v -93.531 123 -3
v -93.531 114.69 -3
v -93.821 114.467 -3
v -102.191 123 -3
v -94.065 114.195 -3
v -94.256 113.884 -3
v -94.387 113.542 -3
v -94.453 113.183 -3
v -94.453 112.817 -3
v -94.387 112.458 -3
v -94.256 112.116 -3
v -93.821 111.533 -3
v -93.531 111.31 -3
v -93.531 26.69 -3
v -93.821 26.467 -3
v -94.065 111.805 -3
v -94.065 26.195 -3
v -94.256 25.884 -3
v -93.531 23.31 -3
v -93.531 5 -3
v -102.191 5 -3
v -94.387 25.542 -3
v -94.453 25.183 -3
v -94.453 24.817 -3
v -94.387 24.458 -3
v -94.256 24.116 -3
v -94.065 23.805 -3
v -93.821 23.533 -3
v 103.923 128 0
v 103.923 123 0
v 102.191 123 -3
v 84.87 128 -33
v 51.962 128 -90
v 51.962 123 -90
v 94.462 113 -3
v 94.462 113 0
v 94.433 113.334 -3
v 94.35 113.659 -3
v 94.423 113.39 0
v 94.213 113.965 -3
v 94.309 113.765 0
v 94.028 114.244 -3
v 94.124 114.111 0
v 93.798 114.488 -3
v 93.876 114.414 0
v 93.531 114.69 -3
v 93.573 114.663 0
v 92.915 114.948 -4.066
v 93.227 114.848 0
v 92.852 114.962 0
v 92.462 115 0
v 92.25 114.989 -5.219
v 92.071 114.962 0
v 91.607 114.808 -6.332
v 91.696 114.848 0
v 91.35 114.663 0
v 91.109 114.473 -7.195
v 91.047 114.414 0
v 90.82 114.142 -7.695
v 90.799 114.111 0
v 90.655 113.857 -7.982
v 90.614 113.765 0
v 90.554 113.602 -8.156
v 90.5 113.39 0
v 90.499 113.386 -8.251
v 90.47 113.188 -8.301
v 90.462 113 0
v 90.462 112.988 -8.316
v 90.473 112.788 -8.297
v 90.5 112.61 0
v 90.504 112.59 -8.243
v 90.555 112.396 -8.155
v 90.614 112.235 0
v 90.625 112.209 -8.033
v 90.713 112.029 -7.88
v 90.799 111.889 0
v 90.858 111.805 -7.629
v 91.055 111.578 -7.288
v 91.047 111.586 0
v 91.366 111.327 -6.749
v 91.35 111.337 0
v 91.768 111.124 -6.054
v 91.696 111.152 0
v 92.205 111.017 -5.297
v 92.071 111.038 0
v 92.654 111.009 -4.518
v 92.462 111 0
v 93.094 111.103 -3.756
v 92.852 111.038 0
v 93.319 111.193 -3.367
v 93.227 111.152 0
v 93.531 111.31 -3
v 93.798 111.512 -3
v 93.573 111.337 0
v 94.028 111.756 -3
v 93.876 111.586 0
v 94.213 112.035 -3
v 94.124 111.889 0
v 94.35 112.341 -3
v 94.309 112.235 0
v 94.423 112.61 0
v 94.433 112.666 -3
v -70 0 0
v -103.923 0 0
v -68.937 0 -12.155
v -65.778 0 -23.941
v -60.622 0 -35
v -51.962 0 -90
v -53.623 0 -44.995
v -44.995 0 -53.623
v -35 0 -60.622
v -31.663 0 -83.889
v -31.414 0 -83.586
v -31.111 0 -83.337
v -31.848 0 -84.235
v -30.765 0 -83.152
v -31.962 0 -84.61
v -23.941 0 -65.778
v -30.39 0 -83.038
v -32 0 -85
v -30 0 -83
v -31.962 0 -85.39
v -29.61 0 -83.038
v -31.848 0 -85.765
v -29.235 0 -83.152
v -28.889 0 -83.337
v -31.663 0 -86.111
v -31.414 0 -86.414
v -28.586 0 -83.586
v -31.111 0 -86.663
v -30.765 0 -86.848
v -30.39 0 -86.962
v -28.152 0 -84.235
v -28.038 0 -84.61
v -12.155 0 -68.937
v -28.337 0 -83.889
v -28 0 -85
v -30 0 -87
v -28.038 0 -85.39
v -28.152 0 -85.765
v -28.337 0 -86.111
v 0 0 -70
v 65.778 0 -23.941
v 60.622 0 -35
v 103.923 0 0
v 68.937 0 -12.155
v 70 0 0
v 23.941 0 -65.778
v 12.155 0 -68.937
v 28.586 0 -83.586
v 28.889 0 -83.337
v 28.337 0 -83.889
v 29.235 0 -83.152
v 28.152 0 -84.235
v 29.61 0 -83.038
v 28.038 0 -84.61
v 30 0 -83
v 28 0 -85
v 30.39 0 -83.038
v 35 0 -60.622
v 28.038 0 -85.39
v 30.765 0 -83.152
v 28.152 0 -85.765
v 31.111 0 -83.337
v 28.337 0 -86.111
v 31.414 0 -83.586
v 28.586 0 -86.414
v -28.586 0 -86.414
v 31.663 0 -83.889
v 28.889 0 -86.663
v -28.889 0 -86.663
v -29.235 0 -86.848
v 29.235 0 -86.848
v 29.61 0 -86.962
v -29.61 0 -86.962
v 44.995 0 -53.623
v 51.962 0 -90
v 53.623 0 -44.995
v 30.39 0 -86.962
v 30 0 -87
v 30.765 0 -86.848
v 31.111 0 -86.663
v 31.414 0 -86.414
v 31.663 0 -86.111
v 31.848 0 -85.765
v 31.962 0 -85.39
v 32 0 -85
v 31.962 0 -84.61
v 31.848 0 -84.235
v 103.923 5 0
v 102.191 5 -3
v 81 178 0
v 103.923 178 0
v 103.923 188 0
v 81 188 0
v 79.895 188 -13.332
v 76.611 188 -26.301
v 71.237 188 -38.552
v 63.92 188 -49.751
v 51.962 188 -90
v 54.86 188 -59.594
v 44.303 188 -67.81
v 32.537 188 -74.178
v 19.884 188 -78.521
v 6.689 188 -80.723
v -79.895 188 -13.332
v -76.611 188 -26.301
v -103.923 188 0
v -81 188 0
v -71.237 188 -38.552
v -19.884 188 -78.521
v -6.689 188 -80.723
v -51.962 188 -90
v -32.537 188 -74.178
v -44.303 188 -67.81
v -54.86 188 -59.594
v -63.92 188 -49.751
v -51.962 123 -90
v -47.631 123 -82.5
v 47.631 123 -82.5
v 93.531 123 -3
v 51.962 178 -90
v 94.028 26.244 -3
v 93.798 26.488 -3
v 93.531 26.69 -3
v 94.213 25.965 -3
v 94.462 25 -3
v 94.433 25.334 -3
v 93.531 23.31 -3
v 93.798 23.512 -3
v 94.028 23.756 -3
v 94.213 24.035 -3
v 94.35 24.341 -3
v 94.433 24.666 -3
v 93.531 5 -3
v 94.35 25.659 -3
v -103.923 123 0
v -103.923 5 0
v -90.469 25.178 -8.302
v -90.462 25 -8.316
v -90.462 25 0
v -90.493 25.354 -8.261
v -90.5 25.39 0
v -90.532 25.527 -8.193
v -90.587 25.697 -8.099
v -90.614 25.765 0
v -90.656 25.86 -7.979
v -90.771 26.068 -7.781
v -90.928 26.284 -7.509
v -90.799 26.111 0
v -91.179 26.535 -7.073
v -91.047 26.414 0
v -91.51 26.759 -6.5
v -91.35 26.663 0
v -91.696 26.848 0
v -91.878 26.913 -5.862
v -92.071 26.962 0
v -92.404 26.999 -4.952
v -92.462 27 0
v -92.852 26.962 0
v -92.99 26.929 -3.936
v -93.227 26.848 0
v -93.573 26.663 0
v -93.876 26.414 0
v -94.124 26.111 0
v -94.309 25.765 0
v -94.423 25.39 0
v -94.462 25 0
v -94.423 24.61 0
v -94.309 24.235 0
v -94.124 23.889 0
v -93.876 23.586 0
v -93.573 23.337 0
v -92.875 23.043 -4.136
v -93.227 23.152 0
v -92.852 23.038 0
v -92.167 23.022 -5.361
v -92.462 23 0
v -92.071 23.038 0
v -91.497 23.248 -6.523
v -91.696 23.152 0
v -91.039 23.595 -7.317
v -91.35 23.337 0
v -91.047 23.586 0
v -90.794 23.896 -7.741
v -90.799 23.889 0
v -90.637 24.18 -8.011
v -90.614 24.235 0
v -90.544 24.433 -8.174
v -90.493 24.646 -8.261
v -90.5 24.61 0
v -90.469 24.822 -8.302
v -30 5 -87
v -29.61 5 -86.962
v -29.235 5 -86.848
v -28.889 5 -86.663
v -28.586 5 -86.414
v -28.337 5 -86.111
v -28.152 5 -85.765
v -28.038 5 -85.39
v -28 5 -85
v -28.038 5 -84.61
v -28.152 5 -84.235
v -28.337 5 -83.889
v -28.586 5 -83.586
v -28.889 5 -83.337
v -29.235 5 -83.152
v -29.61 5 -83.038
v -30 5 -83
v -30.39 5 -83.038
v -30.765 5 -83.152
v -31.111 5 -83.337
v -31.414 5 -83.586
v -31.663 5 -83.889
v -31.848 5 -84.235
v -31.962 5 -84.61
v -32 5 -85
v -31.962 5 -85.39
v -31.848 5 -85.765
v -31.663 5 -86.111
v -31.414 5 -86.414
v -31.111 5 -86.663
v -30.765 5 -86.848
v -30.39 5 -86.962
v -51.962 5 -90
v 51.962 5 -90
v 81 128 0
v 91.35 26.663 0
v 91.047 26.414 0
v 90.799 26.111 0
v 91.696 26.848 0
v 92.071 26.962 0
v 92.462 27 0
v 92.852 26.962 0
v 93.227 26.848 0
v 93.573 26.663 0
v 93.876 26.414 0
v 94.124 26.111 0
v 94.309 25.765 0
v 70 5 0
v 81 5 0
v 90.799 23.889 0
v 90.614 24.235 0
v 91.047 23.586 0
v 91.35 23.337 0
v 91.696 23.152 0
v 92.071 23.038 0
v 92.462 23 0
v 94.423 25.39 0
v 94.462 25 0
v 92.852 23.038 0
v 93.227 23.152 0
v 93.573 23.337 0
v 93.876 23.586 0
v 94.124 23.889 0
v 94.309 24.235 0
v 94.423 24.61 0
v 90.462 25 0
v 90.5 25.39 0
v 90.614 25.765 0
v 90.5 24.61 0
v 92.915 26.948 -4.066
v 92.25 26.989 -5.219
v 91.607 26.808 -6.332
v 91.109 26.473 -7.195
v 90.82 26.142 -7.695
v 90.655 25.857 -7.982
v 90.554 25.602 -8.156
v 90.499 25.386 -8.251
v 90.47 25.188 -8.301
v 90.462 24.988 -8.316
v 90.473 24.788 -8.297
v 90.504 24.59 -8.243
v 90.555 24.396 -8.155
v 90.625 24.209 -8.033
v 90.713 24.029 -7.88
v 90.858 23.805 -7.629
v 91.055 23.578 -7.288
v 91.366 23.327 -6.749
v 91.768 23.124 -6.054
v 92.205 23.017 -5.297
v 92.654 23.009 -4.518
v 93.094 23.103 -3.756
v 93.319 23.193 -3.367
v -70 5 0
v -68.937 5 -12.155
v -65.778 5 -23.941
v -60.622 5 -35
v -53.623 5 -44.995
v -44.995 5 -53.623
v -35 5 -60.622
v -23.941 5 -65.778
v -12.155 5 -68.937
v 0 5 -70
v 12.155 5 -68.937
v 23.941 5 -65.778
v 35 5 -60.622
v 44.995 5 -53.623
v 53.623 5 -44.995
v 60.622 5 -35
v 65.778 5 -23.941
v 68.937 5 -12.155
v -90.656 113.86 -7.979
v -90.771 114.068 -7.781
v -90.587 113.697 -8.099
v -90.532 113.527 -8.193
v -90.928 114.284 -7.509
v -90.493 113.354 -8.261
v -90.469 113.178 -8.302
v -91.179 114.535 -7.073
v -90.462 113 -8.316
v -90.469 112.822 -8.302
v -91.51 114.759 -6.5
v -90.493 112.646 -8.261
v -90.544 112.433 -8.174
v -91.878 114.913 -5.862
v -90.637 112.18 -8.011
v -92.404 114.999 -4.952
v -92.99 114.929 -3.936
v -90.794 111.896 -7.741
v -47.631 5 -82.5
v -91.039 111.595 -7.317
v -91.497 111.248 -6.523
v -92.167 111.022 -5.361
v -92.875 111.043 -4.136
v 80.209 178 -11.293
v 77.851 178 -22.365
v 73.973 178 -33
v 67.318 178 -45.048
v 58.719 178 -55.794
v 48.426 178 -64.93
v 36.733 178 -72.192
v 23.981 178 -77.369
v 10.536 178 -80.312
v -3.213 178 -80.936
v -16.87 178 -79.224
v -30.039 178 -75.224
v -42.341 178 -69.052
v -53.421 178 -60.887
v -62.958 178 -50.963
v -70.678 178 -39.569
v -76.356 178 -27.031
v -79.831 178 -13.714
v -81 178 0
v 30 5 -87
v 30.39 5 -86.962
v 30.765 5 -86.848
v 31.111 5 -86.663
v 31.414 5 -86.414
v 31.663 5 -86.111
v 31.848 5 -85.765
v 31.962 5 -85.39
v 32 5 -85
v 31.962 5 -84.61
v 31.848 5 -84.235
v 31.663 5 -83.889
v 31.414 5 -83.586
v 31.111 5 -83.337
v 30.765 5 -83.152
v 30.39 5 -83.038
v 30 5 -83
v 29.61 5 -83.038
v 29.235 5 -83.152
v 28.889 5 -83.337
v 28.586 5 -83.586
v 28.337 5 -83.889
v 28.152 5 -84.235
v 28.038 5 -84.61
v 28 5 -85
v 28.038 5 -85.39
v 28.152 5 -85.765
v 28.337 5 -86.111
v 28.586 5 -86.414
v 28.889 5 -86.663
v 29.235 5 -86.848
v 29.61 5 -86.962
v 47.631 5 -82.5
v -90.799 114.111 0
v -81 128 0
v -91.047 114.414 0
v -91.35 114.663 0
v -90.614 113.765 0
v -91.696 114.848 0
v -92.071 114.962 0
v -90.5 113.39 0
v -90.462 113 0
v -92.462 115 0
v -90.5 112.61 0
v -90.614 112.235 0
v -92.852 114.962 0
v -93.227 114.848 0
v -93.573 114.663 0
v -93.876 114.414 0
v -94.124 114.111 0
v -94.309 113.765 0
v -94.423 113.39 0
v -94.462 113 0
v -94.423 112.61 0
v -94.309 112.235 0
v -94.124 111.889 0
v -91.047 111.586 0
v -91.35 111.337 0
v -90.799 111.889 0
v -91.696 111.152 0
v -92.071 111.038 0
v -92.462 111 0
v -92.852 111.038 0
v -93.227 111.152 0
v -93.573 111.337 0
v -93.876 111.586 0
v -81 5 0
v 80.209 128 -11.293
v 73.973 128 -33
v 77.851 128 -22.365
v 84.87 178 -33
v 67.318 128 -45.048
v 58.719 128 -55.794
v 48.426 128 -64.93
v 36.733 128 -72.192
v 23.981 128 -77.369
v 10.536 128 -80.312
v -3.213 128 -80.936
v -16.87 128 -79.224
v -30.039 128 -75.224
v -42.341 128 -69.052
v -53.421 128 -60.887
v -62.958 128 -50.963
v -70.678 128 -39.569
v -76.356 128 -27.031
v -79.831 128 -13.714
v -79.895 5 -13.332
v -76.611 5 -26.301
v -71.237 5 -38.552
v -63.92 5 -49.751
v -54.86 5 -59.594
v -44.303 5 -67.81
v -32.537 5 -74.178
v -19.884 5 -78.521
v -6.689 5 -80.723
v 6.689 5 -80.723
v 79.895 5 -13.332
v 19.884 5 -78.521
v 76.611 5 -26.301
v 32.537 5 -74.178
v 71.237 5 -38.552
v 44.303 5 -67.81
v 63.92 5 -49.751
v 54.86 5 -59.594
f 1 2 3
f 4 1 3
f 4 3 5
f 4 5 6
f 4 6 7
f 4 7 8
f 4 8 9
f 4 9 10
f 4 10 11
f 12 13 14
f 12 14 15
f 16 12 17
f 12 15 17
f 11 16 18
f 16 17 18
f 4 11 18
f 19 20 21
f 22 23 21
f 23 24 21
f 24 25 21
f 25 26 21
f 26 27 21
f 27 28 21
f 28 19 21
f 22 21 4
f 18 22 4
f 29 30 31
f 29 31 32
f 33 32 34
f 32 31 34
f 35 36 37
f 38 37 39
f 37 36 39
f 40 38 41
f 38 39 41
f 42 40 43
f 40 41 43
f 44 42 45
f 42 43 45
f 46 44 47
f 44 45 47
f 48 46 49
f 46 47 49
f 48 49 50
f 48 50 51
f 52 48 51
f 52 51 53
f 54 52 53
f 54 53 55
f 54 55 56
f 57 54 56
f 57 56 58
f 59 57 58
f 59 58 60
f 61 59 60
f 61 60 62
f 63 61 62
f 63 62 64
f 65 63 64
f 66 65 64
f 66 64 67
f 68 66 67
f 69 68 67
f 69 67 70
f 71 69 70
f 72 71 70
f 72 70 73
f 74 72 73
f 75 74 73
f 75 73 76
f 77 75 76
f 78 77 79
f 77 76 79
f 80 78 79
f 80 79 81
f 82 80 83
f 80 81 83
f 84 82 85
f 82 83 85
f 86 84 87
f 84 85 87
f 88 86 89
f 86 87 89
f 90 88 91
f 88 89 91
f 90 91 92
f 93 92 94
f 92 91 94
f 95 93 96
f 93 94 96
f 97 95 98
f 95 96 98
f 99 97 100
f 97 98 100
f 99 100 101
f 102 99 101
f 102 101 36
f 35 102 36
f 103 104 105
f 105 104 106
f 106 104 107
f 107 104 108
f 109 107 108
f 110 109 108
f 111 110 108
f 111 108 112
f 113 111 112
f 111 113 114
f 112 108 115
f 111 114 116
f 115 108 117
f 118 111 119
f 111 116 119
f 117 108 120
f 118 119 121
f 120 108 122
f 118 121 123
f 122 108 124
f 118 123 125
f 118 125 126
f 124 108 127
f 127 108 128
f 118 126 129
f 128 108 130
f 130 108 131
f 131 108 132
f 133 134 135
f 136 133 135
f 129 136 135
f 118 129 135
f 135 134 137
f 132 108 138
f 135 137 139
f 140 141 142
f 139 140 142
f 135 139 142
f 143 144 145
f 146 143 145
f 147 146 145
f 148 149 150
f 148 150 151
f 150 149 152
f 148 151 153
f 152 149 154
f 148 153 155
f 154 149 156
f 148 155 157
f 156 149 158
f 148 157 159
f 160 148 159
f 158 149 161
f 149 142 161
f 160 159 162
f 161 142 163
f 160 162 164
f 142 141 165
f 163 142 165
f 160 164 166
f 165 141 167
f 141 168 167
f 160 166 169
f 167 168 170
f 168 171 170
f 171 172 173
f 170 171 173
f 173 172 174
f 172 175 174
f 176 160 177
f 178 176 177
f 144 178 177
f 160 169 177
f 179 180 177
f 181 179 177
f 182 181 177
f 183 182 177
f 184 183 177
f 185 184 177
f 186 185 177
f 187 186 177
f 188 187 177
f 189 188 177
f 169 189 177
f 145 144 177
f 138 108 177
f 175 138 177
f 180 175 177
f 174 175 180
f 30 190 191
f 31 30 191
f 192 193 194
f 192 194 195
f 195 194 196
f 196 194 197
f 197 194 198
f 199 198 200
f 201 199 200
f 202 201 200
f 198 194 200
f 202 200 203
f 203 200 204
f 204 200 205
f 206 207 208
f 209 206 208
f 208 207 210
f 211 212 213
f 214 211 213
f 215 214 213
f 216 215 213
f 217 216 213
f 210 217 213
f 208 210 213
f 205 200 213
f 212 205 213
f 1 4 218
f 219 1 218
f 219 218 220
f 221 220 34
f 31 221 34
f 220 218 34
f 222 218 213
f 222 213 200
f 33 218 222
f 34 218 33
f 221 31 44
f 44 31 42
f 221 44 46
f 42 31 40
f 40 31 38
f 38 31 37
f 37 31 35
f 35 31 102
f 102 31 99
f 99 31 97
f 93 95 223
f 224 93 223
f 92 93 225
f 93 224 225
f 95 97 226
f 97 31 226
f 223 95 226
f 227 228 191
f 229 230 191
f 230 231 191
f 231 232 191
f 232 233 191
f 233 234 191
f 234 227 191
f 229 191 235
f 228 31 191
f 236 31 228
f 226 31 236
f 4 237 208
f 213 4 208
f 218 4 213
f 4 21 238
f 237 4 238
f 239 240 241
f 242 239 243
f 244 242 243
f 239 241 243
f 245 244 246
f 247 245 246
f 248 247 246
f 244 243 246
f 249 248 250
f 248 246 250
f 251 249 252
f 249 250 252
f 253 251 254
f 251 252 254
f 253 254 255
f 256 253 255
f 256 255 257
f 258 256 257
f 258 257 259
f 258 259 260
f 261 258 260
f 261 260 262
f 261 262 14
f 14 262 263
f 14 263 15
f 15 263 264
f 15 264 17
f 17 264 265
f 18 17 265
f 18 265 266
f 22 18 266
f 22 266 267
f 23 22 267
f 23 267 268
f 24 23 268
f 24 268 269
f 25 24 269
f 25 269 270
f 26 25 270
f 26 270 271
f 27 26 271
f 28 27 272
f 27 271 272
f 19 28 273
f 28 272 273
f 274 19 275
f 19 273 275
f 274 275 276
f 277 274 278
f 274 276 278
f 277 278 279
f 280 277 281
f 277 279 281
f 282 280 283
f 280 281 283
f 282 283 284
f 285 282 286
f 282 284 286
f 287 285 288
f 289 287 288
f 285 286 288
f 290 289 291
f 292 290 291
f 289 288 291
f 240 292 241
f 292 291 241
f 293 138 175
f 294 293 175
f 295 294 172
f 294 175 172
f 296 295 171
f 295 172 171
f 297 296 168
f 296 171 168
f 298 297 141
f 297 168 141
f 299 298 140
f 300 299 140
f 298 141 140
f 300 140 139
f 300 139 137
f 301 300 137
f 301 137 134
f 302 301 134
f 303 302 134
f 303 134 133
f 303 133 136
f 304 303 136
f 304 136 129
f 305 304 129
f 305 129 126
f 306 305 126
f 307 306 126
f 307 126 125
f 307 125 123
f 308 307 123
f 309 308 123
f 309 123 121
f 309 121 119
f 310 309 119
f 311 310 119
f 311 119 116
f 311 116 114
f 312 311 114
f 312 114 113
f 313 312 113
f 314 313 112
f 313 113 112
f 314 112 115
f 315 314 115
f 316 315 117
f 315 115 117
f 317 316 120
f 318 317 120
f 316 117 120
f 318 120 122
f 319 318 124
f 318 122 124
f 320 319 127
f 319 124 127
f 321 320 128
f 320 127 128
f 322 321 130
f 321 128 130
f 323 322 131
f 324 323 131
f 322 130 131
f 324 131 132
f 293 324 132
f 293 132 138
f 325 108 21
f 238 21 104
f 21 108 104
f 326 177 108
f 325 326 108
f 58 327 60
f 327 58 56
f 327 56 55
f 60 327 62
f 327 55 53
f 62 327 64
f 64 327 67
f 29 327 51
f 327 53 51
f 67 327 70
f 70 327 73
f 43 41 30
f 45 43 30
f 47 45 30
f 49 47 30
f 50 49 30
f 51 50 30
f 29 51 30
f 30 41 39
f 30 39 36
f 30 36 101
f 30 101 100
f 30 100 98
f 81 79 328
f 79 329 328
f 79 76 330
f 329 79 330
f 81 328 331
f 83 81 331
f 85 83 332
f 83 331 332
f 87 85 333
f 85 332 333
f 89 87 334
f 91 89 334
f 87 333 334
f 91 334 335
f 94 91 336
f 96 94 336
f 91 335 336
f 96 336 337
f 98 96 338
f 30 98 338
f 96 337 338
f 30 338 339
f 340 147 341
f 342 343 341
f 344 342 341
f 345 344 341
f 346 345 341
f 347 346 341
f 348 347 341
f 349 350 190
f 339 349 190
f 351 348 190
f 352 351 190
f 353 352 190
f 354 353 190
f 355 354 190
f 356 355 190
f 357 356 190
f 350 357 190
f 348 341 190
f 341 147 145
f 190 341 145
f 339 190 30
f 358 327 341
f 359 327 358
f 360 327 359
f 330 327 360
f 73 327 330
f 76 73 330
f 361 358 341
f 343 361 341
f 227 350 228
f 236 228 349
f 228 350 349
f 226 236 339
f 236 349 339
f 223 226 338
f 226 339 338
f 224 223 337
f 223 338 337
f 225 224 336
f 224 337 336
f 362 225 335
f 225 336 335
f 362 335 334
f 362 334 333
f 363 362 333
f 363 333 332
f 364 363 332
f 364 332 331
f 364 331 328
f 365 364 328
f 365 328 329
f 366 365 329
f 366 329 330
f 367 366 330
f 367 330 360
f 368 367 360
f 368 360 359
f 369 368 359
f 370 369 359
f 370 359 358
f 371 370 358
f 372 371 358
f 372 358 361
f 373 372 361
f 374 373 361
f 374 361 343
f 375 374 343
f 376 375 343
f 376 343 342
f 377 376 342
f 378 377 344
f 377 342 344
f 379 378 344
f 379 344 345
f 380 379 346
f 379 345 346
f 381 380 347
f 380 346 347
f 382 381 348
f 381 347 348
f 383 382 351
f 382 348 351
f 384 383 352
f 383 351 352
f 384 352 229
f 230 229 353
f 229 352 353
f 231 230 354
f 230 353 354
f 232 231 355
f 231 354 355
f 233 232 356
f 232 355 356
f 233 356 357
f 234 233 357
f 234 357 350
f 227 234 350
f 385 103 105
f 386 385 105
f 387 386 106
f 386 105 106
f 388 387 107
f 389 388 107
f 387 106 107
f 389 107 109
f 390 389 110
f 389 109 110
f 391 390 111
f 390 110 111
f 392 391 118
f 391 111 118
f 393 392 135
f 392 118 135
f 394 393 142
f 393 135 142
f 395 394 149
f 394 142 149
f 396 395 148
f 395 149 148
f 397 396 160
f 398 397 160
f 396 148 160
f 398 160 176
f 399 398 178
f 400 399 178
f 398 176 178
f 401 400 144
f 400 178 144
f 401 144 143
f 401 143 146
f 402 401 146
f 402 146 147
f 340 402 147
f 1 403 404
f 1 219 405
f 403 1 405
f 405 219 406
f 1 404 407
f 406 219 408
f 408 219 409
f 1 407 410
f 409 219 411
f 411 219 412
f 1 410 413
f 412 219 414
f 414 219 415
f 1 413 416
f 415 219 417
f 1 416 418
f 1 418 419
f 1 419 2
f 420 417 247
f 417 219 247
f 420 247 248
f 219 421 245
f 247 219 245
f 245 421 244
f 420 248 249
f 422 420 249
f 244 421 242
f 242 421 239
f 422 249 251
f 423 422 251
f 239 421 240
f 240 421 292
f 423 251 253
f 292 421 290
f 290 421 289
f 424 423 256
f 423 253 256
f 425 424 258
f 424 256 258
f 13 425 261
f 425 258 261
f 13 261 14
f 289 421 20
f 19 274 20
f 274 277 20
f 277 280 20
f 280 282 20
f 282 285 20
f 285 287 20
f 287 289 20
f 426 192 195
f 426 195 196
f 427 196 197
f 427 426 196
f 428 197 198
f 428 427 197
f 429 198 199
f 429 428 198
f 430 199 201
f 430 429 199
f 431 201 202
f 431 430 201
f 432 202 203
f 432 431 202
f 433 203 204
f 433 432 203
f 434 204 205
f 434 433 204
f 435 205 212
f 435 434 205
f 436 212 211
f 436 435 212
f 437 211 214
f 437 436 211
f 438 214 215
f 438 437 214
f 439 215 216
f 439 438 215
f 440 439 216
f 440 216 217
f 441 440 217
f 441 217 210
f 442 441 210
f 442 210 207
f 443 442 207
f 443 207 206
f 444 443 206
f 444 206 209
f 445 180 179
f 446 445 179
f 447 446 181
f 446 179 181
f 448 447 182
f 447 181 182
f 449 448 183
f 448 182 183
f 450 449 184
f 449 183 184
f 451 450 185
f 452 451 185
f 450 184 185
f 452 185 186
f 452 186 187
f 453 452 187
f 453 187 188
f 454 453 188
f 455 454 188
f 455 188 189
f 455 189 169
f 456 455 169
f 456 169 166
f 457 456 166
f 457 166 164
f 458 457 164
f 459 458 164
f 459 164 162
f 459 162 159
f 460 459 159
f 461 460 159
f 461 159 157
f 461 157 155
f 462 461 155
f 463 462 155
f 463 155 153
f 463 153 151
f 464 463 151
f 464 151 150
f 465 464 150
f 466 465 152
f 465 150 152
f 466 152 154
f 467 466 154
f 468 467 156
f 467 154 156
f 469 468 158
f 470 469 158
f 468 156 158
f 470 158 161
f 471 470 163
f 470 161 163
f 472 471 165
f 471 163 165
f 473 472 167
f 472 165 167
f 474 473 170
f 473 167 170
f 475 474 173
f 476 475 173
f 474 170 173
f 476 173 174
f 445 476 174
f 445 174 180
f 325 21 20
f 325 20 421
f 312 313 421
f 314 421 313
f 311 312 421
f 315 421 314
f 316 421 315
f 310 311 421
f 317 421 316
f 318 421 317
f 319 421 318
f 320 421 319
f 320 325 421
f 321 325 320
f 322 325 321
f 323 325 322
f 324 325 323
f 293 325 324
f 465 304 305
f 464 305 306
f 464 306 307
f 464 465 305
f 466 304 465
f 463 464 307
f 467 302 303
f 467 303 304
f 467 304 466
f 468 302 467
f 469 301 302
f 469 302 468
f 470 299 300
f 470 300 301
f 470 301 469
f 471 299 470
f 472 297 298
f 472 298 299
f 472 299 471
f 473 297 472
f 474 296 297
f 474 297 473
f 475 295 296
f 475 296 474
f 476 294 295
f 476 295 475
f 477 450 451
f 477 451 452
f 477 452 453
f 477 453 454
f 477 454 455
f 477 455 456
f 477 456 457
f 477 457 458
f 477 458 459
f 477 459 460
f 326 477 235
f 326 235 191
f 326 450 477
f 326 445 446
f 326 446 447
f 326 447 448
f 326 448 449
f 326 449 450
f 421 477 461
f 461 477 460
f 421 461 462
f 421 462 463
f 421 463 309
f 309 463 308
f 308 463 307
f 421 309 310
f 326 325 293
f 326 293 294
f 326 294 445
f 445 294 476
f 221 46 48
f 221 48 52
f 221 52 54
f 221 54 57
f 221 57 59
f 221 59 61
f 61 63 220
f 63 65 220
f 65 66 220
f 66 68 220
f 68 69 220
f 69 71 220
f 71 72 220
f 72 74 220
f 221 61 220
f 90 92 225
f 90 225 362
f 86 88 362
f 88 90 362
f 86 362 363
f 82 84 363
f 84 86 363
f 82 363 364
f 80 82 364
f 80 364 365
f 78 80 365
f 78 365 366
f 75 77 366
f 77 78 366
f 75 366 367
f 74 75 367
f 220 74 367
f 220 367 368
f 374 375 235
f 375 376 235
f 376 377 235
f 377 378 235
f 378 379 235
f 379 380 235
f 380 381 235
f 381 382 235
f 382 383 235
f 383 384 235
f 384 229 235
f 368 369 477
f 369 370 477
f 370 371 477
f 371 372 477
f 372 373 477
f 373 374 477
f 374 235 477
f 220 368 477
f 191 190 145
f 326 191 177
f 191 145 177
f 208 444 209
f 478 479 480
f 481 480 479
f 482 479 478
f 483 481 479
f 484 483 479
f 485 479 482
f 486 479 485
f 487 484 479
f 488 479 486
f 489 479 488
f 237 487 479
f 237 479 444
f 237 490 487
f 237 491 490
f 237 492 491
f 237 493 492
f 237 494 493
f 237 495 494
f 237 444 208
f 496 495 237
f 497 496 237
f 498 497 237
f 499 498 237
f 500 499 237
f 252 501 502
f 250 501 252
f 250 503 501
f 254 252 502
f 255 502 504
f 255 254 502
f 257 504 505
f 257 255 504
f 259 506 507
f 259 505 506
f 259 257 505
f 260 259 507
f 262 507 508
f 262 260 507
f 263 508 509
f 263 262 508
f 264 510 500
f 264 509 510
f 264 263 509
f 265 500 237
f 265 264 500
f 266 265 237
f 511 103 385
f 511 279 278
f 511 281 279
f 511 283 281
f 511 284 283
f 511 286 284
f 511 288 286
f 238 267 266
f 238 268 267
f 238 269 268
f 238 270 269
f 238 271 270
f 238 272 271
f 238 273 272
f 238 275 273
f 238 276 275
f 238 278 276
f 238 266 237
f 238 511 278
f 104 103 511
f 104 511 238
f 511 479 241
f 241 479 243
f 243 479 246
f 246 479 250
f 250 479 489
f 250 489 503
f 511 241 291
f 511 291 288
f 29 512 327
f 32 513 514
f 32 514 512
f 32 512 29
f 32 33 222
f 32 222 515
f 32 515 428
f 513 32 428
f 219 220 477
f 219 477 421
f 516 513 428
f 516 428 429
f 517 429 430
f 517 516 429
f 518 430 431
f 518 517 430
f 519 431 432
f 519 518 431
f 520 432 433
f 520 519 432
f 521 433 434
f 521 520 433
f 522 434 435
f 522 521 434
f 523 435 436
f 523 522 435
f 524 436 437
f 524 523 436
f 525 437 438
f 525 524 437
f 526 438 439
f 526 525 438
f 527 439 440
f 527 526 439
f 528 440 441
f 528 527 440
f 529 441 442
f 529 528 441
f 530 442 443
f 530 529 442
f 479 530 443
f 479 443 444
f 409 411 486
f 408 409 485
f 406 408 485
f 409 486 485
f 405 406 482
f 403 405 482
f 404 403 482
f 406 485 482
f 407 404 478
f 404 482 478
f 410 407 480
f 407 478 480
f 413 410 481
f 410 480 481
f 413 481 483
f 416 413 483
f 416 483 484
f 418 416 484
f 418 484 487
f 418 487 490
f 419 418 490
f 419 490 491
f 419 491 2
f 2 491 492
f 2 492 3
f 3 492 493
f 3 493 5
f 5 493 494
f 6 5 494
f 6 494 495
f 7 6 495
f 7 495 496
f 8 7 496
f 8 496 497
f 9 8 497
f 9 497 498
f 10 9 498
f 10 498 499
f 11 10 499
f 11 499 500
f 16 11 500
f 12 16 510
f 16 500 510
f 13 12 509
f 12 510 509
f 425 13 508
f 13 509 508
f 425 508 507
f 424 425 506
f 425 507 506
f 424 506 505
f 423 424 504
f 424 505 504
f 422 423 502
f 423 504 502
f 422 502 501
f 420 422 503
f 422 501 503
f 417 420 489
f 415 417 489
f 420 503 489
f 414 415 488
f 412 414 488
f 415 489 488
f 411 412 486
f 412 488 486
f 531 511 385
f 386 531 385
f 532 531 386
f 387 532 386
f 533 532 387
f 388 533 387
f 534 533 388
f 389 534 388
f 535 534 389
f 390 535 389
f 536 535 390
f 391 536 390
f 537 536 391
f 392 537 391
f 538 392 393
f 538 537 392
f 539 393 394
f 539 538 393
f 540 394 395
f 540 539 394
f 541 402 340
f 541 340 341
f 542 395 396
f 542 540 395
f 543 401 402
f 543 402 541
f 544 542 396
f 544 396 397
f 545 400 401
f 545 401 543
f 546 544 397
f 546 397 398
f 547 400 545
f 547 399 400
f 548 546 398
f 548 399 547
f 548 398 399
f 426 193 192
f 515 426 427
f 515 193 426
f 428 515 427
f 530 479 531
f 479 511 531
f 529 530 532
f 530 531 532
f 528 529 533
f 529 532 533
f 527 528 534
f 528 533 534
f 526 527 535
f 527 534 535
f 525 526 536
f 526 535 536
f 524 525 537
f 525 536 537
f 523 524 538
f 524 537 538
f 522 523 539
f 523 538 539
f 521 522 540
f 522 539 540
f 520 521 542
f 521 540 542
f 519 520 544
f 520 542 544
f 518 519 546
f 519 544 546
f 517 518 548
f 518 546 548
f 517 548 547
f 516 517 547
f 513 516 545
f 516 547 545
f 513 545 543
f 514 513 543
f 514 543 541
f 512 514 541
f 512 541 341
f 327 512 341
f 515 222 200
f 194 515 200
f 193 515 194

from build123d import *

# Parameters (mm, degrees)
BOSS_EXTRUDE1_DEPTH = 5
BOSS_EXTRUDE2_DEPTH = 118
BOSS_EXTRUDE3_DEPTH = 5
BOSS_EXTRUDE4_DEPTH = 50
BOSS_EXTRUDE5_DEPTH = 10
SKETCH6_R           = 2
CUT_EXTRUDE1_DEPTH  = 10
SKETCH7_R           = 2
CUT_EXTRUDE2_DEPTH  = 10


with BuildPart() as part:
    # Sketch1 → Boss-Extrude1 (new body)
    with BuildSketch(Plane(origin=(0, 0, 0), x_dir=(1, 0, 0), z_dir=(0, 1, 0))):
        with BuildLine():
            Line((-103.923048454, 0), (-70, 0))
            ThreePointArc((-70, 0), (0, 70), (70, 0))
            Line((70, 0), (103.923048454, 0))
            Line((103.923048454, 0), (51.961524227, 90))
            Line((51.961524227, 90), (-51.961524227, 90))
            Line((-51.961524227, 90), (-103.923048454, 0))
        make_face()
    extrude(amount=BOSS_EXTRUDE1_DEPTH)

    # Sketch2 → Boss-Extrude2 (add)
    with BuildSketch(Plane(origin=(0, 5, 0), x_dir=(1, 0, 0), z_dir=(0, 1, 0))):
        with BuildLine():
            Line((-95.262794416, 0), (-81, 0))
            ThreePointArc((-81, 0), (0, 81), (81, 0))
            Line((81, 0), (95.262794416, 0))
            Line((95.262794416, 0), (103.923048454, 0))
            Line((103.923048454, 0), (102.190997647, 3))
            Line((102.190997647, 3), (93.530743609, 3))
            Line((93.530743609, 3), (47.631397208, 82.5))
            Line((47.631397208, 82.5), (-47.631397208, 82.5))
            Line((-47.631397208, 82.5), (-93.530743609, 3))
            Line((-93.530743609, 3), (-102.190997647, 3))
            Line((-102.190997647, 3), (-103.923048454, 0))
            Line((-103.923048454, 0), (-95.262794416, 0))
        make_face()
    extrude(amount=BOSS_EXTRUDE2_DEPTH)

    # Sketch3 → Boss-Extrude3 (add)
    with BuildSketch(Plane(origin=(0, 123, 0), x_dir=(1, 0, 0), z_dir=(0, 1, 0))):
        with BuildLine():
            Line((-103.923048454, 0), (-81, 0))
            ThreePointArc((-81, 0), (0, 81), (81, 0))
            Line((81, 0), (103.923048454, 0))
            Line((103.923048454, 0), (51.961524227, 90))
            Line((51.961524227, 90), (-51.961524227, 90))
            Line((-51.961524227, 90), (-103.923048454, 0))
        make_face()
    extrude(amount=BOSS_EXTRUDE3_DEPTH)

    # Sketch4 → Boss-Extrude4 (add)
    with BuildSketch(Plane(origin=(0, 128, 0), x_dir=(1, 0, 0), z_dir=(0, 1, 0))):
        with BuildLine():
            Line((84.870489571, 33), (73.972968036, 33))
            ThreePointArc((73.972968036, 33), (-16.869937598, 79.22376667), (-81, 0))
            Line((-81, 0), (-103.923048454, 0))
            Line((-103.923048454, 0), (-51.961524227, 90))
            Line((-51.961524227, 90), (51.961524227, 90))
            Line((51.961524227, 90), (84.870489571, 33))
        make_face()
    extrude(amount=BOSS_EXTRUDE4_DEPTH)

    # Sketch5 → Boss-Extrude5 (add)
    with BuildSketch(Plane(origin=(0, 178, 0), x_dir=(1, 0, 0), z_dir=(0, 1, 0))):
        with BuildLine():
            Line((-103.923048454, 0), (-51.961524227, 90))
            Line((-51.961524227, 90), (51.961524227, 90))
            Line((51.961524227, 90), (103.923048454, 0))
            Line((103.923048454, 0), (81, 0))
            ThreePointArc((81, 0), (0, 81), (-81, 0))
            Line((-81, 0), (-103.923048454, 0))
        make_face()
    extrude(amount=BOSS_EXTRUDE5_DEPTH)

    # Sketch6 → Cut-Extrude1 (cut)
    with BuildSketch(Plane.XY):
        with Locations((92.461524227, 113)):
            Circle(SKETCH6_R)
        with Locations((92.461524227, 25)):
            Circle(SKETCH6_R)
        with Locations((-92.461524227, 25)):
            Circle(SKETCH6_R)
        with Locations((-92.461524227, 113)):
            Circle(SKETCH6_R)
    extrude(amount=-CUT_EXTRUDE1_DEPTH, mode=Mode.SUBTRACT)

    # Sketch7 → Cut-Extrude2 (cut)
    with BuildSketch(Plane.XZ):
        with Locations(Location((-30, -85, 0), (0, 0, 270))):
            Circle(SKETCH7_R)
        with Locations(Location((30, -85, 0), (0, 0, 270))):
            Circle(SKETCH7_R)
    extrude(amount=-CUT_EXTRUDE2_DEPTH, mode=Mode.SUBTRACT)


solid = part.part
